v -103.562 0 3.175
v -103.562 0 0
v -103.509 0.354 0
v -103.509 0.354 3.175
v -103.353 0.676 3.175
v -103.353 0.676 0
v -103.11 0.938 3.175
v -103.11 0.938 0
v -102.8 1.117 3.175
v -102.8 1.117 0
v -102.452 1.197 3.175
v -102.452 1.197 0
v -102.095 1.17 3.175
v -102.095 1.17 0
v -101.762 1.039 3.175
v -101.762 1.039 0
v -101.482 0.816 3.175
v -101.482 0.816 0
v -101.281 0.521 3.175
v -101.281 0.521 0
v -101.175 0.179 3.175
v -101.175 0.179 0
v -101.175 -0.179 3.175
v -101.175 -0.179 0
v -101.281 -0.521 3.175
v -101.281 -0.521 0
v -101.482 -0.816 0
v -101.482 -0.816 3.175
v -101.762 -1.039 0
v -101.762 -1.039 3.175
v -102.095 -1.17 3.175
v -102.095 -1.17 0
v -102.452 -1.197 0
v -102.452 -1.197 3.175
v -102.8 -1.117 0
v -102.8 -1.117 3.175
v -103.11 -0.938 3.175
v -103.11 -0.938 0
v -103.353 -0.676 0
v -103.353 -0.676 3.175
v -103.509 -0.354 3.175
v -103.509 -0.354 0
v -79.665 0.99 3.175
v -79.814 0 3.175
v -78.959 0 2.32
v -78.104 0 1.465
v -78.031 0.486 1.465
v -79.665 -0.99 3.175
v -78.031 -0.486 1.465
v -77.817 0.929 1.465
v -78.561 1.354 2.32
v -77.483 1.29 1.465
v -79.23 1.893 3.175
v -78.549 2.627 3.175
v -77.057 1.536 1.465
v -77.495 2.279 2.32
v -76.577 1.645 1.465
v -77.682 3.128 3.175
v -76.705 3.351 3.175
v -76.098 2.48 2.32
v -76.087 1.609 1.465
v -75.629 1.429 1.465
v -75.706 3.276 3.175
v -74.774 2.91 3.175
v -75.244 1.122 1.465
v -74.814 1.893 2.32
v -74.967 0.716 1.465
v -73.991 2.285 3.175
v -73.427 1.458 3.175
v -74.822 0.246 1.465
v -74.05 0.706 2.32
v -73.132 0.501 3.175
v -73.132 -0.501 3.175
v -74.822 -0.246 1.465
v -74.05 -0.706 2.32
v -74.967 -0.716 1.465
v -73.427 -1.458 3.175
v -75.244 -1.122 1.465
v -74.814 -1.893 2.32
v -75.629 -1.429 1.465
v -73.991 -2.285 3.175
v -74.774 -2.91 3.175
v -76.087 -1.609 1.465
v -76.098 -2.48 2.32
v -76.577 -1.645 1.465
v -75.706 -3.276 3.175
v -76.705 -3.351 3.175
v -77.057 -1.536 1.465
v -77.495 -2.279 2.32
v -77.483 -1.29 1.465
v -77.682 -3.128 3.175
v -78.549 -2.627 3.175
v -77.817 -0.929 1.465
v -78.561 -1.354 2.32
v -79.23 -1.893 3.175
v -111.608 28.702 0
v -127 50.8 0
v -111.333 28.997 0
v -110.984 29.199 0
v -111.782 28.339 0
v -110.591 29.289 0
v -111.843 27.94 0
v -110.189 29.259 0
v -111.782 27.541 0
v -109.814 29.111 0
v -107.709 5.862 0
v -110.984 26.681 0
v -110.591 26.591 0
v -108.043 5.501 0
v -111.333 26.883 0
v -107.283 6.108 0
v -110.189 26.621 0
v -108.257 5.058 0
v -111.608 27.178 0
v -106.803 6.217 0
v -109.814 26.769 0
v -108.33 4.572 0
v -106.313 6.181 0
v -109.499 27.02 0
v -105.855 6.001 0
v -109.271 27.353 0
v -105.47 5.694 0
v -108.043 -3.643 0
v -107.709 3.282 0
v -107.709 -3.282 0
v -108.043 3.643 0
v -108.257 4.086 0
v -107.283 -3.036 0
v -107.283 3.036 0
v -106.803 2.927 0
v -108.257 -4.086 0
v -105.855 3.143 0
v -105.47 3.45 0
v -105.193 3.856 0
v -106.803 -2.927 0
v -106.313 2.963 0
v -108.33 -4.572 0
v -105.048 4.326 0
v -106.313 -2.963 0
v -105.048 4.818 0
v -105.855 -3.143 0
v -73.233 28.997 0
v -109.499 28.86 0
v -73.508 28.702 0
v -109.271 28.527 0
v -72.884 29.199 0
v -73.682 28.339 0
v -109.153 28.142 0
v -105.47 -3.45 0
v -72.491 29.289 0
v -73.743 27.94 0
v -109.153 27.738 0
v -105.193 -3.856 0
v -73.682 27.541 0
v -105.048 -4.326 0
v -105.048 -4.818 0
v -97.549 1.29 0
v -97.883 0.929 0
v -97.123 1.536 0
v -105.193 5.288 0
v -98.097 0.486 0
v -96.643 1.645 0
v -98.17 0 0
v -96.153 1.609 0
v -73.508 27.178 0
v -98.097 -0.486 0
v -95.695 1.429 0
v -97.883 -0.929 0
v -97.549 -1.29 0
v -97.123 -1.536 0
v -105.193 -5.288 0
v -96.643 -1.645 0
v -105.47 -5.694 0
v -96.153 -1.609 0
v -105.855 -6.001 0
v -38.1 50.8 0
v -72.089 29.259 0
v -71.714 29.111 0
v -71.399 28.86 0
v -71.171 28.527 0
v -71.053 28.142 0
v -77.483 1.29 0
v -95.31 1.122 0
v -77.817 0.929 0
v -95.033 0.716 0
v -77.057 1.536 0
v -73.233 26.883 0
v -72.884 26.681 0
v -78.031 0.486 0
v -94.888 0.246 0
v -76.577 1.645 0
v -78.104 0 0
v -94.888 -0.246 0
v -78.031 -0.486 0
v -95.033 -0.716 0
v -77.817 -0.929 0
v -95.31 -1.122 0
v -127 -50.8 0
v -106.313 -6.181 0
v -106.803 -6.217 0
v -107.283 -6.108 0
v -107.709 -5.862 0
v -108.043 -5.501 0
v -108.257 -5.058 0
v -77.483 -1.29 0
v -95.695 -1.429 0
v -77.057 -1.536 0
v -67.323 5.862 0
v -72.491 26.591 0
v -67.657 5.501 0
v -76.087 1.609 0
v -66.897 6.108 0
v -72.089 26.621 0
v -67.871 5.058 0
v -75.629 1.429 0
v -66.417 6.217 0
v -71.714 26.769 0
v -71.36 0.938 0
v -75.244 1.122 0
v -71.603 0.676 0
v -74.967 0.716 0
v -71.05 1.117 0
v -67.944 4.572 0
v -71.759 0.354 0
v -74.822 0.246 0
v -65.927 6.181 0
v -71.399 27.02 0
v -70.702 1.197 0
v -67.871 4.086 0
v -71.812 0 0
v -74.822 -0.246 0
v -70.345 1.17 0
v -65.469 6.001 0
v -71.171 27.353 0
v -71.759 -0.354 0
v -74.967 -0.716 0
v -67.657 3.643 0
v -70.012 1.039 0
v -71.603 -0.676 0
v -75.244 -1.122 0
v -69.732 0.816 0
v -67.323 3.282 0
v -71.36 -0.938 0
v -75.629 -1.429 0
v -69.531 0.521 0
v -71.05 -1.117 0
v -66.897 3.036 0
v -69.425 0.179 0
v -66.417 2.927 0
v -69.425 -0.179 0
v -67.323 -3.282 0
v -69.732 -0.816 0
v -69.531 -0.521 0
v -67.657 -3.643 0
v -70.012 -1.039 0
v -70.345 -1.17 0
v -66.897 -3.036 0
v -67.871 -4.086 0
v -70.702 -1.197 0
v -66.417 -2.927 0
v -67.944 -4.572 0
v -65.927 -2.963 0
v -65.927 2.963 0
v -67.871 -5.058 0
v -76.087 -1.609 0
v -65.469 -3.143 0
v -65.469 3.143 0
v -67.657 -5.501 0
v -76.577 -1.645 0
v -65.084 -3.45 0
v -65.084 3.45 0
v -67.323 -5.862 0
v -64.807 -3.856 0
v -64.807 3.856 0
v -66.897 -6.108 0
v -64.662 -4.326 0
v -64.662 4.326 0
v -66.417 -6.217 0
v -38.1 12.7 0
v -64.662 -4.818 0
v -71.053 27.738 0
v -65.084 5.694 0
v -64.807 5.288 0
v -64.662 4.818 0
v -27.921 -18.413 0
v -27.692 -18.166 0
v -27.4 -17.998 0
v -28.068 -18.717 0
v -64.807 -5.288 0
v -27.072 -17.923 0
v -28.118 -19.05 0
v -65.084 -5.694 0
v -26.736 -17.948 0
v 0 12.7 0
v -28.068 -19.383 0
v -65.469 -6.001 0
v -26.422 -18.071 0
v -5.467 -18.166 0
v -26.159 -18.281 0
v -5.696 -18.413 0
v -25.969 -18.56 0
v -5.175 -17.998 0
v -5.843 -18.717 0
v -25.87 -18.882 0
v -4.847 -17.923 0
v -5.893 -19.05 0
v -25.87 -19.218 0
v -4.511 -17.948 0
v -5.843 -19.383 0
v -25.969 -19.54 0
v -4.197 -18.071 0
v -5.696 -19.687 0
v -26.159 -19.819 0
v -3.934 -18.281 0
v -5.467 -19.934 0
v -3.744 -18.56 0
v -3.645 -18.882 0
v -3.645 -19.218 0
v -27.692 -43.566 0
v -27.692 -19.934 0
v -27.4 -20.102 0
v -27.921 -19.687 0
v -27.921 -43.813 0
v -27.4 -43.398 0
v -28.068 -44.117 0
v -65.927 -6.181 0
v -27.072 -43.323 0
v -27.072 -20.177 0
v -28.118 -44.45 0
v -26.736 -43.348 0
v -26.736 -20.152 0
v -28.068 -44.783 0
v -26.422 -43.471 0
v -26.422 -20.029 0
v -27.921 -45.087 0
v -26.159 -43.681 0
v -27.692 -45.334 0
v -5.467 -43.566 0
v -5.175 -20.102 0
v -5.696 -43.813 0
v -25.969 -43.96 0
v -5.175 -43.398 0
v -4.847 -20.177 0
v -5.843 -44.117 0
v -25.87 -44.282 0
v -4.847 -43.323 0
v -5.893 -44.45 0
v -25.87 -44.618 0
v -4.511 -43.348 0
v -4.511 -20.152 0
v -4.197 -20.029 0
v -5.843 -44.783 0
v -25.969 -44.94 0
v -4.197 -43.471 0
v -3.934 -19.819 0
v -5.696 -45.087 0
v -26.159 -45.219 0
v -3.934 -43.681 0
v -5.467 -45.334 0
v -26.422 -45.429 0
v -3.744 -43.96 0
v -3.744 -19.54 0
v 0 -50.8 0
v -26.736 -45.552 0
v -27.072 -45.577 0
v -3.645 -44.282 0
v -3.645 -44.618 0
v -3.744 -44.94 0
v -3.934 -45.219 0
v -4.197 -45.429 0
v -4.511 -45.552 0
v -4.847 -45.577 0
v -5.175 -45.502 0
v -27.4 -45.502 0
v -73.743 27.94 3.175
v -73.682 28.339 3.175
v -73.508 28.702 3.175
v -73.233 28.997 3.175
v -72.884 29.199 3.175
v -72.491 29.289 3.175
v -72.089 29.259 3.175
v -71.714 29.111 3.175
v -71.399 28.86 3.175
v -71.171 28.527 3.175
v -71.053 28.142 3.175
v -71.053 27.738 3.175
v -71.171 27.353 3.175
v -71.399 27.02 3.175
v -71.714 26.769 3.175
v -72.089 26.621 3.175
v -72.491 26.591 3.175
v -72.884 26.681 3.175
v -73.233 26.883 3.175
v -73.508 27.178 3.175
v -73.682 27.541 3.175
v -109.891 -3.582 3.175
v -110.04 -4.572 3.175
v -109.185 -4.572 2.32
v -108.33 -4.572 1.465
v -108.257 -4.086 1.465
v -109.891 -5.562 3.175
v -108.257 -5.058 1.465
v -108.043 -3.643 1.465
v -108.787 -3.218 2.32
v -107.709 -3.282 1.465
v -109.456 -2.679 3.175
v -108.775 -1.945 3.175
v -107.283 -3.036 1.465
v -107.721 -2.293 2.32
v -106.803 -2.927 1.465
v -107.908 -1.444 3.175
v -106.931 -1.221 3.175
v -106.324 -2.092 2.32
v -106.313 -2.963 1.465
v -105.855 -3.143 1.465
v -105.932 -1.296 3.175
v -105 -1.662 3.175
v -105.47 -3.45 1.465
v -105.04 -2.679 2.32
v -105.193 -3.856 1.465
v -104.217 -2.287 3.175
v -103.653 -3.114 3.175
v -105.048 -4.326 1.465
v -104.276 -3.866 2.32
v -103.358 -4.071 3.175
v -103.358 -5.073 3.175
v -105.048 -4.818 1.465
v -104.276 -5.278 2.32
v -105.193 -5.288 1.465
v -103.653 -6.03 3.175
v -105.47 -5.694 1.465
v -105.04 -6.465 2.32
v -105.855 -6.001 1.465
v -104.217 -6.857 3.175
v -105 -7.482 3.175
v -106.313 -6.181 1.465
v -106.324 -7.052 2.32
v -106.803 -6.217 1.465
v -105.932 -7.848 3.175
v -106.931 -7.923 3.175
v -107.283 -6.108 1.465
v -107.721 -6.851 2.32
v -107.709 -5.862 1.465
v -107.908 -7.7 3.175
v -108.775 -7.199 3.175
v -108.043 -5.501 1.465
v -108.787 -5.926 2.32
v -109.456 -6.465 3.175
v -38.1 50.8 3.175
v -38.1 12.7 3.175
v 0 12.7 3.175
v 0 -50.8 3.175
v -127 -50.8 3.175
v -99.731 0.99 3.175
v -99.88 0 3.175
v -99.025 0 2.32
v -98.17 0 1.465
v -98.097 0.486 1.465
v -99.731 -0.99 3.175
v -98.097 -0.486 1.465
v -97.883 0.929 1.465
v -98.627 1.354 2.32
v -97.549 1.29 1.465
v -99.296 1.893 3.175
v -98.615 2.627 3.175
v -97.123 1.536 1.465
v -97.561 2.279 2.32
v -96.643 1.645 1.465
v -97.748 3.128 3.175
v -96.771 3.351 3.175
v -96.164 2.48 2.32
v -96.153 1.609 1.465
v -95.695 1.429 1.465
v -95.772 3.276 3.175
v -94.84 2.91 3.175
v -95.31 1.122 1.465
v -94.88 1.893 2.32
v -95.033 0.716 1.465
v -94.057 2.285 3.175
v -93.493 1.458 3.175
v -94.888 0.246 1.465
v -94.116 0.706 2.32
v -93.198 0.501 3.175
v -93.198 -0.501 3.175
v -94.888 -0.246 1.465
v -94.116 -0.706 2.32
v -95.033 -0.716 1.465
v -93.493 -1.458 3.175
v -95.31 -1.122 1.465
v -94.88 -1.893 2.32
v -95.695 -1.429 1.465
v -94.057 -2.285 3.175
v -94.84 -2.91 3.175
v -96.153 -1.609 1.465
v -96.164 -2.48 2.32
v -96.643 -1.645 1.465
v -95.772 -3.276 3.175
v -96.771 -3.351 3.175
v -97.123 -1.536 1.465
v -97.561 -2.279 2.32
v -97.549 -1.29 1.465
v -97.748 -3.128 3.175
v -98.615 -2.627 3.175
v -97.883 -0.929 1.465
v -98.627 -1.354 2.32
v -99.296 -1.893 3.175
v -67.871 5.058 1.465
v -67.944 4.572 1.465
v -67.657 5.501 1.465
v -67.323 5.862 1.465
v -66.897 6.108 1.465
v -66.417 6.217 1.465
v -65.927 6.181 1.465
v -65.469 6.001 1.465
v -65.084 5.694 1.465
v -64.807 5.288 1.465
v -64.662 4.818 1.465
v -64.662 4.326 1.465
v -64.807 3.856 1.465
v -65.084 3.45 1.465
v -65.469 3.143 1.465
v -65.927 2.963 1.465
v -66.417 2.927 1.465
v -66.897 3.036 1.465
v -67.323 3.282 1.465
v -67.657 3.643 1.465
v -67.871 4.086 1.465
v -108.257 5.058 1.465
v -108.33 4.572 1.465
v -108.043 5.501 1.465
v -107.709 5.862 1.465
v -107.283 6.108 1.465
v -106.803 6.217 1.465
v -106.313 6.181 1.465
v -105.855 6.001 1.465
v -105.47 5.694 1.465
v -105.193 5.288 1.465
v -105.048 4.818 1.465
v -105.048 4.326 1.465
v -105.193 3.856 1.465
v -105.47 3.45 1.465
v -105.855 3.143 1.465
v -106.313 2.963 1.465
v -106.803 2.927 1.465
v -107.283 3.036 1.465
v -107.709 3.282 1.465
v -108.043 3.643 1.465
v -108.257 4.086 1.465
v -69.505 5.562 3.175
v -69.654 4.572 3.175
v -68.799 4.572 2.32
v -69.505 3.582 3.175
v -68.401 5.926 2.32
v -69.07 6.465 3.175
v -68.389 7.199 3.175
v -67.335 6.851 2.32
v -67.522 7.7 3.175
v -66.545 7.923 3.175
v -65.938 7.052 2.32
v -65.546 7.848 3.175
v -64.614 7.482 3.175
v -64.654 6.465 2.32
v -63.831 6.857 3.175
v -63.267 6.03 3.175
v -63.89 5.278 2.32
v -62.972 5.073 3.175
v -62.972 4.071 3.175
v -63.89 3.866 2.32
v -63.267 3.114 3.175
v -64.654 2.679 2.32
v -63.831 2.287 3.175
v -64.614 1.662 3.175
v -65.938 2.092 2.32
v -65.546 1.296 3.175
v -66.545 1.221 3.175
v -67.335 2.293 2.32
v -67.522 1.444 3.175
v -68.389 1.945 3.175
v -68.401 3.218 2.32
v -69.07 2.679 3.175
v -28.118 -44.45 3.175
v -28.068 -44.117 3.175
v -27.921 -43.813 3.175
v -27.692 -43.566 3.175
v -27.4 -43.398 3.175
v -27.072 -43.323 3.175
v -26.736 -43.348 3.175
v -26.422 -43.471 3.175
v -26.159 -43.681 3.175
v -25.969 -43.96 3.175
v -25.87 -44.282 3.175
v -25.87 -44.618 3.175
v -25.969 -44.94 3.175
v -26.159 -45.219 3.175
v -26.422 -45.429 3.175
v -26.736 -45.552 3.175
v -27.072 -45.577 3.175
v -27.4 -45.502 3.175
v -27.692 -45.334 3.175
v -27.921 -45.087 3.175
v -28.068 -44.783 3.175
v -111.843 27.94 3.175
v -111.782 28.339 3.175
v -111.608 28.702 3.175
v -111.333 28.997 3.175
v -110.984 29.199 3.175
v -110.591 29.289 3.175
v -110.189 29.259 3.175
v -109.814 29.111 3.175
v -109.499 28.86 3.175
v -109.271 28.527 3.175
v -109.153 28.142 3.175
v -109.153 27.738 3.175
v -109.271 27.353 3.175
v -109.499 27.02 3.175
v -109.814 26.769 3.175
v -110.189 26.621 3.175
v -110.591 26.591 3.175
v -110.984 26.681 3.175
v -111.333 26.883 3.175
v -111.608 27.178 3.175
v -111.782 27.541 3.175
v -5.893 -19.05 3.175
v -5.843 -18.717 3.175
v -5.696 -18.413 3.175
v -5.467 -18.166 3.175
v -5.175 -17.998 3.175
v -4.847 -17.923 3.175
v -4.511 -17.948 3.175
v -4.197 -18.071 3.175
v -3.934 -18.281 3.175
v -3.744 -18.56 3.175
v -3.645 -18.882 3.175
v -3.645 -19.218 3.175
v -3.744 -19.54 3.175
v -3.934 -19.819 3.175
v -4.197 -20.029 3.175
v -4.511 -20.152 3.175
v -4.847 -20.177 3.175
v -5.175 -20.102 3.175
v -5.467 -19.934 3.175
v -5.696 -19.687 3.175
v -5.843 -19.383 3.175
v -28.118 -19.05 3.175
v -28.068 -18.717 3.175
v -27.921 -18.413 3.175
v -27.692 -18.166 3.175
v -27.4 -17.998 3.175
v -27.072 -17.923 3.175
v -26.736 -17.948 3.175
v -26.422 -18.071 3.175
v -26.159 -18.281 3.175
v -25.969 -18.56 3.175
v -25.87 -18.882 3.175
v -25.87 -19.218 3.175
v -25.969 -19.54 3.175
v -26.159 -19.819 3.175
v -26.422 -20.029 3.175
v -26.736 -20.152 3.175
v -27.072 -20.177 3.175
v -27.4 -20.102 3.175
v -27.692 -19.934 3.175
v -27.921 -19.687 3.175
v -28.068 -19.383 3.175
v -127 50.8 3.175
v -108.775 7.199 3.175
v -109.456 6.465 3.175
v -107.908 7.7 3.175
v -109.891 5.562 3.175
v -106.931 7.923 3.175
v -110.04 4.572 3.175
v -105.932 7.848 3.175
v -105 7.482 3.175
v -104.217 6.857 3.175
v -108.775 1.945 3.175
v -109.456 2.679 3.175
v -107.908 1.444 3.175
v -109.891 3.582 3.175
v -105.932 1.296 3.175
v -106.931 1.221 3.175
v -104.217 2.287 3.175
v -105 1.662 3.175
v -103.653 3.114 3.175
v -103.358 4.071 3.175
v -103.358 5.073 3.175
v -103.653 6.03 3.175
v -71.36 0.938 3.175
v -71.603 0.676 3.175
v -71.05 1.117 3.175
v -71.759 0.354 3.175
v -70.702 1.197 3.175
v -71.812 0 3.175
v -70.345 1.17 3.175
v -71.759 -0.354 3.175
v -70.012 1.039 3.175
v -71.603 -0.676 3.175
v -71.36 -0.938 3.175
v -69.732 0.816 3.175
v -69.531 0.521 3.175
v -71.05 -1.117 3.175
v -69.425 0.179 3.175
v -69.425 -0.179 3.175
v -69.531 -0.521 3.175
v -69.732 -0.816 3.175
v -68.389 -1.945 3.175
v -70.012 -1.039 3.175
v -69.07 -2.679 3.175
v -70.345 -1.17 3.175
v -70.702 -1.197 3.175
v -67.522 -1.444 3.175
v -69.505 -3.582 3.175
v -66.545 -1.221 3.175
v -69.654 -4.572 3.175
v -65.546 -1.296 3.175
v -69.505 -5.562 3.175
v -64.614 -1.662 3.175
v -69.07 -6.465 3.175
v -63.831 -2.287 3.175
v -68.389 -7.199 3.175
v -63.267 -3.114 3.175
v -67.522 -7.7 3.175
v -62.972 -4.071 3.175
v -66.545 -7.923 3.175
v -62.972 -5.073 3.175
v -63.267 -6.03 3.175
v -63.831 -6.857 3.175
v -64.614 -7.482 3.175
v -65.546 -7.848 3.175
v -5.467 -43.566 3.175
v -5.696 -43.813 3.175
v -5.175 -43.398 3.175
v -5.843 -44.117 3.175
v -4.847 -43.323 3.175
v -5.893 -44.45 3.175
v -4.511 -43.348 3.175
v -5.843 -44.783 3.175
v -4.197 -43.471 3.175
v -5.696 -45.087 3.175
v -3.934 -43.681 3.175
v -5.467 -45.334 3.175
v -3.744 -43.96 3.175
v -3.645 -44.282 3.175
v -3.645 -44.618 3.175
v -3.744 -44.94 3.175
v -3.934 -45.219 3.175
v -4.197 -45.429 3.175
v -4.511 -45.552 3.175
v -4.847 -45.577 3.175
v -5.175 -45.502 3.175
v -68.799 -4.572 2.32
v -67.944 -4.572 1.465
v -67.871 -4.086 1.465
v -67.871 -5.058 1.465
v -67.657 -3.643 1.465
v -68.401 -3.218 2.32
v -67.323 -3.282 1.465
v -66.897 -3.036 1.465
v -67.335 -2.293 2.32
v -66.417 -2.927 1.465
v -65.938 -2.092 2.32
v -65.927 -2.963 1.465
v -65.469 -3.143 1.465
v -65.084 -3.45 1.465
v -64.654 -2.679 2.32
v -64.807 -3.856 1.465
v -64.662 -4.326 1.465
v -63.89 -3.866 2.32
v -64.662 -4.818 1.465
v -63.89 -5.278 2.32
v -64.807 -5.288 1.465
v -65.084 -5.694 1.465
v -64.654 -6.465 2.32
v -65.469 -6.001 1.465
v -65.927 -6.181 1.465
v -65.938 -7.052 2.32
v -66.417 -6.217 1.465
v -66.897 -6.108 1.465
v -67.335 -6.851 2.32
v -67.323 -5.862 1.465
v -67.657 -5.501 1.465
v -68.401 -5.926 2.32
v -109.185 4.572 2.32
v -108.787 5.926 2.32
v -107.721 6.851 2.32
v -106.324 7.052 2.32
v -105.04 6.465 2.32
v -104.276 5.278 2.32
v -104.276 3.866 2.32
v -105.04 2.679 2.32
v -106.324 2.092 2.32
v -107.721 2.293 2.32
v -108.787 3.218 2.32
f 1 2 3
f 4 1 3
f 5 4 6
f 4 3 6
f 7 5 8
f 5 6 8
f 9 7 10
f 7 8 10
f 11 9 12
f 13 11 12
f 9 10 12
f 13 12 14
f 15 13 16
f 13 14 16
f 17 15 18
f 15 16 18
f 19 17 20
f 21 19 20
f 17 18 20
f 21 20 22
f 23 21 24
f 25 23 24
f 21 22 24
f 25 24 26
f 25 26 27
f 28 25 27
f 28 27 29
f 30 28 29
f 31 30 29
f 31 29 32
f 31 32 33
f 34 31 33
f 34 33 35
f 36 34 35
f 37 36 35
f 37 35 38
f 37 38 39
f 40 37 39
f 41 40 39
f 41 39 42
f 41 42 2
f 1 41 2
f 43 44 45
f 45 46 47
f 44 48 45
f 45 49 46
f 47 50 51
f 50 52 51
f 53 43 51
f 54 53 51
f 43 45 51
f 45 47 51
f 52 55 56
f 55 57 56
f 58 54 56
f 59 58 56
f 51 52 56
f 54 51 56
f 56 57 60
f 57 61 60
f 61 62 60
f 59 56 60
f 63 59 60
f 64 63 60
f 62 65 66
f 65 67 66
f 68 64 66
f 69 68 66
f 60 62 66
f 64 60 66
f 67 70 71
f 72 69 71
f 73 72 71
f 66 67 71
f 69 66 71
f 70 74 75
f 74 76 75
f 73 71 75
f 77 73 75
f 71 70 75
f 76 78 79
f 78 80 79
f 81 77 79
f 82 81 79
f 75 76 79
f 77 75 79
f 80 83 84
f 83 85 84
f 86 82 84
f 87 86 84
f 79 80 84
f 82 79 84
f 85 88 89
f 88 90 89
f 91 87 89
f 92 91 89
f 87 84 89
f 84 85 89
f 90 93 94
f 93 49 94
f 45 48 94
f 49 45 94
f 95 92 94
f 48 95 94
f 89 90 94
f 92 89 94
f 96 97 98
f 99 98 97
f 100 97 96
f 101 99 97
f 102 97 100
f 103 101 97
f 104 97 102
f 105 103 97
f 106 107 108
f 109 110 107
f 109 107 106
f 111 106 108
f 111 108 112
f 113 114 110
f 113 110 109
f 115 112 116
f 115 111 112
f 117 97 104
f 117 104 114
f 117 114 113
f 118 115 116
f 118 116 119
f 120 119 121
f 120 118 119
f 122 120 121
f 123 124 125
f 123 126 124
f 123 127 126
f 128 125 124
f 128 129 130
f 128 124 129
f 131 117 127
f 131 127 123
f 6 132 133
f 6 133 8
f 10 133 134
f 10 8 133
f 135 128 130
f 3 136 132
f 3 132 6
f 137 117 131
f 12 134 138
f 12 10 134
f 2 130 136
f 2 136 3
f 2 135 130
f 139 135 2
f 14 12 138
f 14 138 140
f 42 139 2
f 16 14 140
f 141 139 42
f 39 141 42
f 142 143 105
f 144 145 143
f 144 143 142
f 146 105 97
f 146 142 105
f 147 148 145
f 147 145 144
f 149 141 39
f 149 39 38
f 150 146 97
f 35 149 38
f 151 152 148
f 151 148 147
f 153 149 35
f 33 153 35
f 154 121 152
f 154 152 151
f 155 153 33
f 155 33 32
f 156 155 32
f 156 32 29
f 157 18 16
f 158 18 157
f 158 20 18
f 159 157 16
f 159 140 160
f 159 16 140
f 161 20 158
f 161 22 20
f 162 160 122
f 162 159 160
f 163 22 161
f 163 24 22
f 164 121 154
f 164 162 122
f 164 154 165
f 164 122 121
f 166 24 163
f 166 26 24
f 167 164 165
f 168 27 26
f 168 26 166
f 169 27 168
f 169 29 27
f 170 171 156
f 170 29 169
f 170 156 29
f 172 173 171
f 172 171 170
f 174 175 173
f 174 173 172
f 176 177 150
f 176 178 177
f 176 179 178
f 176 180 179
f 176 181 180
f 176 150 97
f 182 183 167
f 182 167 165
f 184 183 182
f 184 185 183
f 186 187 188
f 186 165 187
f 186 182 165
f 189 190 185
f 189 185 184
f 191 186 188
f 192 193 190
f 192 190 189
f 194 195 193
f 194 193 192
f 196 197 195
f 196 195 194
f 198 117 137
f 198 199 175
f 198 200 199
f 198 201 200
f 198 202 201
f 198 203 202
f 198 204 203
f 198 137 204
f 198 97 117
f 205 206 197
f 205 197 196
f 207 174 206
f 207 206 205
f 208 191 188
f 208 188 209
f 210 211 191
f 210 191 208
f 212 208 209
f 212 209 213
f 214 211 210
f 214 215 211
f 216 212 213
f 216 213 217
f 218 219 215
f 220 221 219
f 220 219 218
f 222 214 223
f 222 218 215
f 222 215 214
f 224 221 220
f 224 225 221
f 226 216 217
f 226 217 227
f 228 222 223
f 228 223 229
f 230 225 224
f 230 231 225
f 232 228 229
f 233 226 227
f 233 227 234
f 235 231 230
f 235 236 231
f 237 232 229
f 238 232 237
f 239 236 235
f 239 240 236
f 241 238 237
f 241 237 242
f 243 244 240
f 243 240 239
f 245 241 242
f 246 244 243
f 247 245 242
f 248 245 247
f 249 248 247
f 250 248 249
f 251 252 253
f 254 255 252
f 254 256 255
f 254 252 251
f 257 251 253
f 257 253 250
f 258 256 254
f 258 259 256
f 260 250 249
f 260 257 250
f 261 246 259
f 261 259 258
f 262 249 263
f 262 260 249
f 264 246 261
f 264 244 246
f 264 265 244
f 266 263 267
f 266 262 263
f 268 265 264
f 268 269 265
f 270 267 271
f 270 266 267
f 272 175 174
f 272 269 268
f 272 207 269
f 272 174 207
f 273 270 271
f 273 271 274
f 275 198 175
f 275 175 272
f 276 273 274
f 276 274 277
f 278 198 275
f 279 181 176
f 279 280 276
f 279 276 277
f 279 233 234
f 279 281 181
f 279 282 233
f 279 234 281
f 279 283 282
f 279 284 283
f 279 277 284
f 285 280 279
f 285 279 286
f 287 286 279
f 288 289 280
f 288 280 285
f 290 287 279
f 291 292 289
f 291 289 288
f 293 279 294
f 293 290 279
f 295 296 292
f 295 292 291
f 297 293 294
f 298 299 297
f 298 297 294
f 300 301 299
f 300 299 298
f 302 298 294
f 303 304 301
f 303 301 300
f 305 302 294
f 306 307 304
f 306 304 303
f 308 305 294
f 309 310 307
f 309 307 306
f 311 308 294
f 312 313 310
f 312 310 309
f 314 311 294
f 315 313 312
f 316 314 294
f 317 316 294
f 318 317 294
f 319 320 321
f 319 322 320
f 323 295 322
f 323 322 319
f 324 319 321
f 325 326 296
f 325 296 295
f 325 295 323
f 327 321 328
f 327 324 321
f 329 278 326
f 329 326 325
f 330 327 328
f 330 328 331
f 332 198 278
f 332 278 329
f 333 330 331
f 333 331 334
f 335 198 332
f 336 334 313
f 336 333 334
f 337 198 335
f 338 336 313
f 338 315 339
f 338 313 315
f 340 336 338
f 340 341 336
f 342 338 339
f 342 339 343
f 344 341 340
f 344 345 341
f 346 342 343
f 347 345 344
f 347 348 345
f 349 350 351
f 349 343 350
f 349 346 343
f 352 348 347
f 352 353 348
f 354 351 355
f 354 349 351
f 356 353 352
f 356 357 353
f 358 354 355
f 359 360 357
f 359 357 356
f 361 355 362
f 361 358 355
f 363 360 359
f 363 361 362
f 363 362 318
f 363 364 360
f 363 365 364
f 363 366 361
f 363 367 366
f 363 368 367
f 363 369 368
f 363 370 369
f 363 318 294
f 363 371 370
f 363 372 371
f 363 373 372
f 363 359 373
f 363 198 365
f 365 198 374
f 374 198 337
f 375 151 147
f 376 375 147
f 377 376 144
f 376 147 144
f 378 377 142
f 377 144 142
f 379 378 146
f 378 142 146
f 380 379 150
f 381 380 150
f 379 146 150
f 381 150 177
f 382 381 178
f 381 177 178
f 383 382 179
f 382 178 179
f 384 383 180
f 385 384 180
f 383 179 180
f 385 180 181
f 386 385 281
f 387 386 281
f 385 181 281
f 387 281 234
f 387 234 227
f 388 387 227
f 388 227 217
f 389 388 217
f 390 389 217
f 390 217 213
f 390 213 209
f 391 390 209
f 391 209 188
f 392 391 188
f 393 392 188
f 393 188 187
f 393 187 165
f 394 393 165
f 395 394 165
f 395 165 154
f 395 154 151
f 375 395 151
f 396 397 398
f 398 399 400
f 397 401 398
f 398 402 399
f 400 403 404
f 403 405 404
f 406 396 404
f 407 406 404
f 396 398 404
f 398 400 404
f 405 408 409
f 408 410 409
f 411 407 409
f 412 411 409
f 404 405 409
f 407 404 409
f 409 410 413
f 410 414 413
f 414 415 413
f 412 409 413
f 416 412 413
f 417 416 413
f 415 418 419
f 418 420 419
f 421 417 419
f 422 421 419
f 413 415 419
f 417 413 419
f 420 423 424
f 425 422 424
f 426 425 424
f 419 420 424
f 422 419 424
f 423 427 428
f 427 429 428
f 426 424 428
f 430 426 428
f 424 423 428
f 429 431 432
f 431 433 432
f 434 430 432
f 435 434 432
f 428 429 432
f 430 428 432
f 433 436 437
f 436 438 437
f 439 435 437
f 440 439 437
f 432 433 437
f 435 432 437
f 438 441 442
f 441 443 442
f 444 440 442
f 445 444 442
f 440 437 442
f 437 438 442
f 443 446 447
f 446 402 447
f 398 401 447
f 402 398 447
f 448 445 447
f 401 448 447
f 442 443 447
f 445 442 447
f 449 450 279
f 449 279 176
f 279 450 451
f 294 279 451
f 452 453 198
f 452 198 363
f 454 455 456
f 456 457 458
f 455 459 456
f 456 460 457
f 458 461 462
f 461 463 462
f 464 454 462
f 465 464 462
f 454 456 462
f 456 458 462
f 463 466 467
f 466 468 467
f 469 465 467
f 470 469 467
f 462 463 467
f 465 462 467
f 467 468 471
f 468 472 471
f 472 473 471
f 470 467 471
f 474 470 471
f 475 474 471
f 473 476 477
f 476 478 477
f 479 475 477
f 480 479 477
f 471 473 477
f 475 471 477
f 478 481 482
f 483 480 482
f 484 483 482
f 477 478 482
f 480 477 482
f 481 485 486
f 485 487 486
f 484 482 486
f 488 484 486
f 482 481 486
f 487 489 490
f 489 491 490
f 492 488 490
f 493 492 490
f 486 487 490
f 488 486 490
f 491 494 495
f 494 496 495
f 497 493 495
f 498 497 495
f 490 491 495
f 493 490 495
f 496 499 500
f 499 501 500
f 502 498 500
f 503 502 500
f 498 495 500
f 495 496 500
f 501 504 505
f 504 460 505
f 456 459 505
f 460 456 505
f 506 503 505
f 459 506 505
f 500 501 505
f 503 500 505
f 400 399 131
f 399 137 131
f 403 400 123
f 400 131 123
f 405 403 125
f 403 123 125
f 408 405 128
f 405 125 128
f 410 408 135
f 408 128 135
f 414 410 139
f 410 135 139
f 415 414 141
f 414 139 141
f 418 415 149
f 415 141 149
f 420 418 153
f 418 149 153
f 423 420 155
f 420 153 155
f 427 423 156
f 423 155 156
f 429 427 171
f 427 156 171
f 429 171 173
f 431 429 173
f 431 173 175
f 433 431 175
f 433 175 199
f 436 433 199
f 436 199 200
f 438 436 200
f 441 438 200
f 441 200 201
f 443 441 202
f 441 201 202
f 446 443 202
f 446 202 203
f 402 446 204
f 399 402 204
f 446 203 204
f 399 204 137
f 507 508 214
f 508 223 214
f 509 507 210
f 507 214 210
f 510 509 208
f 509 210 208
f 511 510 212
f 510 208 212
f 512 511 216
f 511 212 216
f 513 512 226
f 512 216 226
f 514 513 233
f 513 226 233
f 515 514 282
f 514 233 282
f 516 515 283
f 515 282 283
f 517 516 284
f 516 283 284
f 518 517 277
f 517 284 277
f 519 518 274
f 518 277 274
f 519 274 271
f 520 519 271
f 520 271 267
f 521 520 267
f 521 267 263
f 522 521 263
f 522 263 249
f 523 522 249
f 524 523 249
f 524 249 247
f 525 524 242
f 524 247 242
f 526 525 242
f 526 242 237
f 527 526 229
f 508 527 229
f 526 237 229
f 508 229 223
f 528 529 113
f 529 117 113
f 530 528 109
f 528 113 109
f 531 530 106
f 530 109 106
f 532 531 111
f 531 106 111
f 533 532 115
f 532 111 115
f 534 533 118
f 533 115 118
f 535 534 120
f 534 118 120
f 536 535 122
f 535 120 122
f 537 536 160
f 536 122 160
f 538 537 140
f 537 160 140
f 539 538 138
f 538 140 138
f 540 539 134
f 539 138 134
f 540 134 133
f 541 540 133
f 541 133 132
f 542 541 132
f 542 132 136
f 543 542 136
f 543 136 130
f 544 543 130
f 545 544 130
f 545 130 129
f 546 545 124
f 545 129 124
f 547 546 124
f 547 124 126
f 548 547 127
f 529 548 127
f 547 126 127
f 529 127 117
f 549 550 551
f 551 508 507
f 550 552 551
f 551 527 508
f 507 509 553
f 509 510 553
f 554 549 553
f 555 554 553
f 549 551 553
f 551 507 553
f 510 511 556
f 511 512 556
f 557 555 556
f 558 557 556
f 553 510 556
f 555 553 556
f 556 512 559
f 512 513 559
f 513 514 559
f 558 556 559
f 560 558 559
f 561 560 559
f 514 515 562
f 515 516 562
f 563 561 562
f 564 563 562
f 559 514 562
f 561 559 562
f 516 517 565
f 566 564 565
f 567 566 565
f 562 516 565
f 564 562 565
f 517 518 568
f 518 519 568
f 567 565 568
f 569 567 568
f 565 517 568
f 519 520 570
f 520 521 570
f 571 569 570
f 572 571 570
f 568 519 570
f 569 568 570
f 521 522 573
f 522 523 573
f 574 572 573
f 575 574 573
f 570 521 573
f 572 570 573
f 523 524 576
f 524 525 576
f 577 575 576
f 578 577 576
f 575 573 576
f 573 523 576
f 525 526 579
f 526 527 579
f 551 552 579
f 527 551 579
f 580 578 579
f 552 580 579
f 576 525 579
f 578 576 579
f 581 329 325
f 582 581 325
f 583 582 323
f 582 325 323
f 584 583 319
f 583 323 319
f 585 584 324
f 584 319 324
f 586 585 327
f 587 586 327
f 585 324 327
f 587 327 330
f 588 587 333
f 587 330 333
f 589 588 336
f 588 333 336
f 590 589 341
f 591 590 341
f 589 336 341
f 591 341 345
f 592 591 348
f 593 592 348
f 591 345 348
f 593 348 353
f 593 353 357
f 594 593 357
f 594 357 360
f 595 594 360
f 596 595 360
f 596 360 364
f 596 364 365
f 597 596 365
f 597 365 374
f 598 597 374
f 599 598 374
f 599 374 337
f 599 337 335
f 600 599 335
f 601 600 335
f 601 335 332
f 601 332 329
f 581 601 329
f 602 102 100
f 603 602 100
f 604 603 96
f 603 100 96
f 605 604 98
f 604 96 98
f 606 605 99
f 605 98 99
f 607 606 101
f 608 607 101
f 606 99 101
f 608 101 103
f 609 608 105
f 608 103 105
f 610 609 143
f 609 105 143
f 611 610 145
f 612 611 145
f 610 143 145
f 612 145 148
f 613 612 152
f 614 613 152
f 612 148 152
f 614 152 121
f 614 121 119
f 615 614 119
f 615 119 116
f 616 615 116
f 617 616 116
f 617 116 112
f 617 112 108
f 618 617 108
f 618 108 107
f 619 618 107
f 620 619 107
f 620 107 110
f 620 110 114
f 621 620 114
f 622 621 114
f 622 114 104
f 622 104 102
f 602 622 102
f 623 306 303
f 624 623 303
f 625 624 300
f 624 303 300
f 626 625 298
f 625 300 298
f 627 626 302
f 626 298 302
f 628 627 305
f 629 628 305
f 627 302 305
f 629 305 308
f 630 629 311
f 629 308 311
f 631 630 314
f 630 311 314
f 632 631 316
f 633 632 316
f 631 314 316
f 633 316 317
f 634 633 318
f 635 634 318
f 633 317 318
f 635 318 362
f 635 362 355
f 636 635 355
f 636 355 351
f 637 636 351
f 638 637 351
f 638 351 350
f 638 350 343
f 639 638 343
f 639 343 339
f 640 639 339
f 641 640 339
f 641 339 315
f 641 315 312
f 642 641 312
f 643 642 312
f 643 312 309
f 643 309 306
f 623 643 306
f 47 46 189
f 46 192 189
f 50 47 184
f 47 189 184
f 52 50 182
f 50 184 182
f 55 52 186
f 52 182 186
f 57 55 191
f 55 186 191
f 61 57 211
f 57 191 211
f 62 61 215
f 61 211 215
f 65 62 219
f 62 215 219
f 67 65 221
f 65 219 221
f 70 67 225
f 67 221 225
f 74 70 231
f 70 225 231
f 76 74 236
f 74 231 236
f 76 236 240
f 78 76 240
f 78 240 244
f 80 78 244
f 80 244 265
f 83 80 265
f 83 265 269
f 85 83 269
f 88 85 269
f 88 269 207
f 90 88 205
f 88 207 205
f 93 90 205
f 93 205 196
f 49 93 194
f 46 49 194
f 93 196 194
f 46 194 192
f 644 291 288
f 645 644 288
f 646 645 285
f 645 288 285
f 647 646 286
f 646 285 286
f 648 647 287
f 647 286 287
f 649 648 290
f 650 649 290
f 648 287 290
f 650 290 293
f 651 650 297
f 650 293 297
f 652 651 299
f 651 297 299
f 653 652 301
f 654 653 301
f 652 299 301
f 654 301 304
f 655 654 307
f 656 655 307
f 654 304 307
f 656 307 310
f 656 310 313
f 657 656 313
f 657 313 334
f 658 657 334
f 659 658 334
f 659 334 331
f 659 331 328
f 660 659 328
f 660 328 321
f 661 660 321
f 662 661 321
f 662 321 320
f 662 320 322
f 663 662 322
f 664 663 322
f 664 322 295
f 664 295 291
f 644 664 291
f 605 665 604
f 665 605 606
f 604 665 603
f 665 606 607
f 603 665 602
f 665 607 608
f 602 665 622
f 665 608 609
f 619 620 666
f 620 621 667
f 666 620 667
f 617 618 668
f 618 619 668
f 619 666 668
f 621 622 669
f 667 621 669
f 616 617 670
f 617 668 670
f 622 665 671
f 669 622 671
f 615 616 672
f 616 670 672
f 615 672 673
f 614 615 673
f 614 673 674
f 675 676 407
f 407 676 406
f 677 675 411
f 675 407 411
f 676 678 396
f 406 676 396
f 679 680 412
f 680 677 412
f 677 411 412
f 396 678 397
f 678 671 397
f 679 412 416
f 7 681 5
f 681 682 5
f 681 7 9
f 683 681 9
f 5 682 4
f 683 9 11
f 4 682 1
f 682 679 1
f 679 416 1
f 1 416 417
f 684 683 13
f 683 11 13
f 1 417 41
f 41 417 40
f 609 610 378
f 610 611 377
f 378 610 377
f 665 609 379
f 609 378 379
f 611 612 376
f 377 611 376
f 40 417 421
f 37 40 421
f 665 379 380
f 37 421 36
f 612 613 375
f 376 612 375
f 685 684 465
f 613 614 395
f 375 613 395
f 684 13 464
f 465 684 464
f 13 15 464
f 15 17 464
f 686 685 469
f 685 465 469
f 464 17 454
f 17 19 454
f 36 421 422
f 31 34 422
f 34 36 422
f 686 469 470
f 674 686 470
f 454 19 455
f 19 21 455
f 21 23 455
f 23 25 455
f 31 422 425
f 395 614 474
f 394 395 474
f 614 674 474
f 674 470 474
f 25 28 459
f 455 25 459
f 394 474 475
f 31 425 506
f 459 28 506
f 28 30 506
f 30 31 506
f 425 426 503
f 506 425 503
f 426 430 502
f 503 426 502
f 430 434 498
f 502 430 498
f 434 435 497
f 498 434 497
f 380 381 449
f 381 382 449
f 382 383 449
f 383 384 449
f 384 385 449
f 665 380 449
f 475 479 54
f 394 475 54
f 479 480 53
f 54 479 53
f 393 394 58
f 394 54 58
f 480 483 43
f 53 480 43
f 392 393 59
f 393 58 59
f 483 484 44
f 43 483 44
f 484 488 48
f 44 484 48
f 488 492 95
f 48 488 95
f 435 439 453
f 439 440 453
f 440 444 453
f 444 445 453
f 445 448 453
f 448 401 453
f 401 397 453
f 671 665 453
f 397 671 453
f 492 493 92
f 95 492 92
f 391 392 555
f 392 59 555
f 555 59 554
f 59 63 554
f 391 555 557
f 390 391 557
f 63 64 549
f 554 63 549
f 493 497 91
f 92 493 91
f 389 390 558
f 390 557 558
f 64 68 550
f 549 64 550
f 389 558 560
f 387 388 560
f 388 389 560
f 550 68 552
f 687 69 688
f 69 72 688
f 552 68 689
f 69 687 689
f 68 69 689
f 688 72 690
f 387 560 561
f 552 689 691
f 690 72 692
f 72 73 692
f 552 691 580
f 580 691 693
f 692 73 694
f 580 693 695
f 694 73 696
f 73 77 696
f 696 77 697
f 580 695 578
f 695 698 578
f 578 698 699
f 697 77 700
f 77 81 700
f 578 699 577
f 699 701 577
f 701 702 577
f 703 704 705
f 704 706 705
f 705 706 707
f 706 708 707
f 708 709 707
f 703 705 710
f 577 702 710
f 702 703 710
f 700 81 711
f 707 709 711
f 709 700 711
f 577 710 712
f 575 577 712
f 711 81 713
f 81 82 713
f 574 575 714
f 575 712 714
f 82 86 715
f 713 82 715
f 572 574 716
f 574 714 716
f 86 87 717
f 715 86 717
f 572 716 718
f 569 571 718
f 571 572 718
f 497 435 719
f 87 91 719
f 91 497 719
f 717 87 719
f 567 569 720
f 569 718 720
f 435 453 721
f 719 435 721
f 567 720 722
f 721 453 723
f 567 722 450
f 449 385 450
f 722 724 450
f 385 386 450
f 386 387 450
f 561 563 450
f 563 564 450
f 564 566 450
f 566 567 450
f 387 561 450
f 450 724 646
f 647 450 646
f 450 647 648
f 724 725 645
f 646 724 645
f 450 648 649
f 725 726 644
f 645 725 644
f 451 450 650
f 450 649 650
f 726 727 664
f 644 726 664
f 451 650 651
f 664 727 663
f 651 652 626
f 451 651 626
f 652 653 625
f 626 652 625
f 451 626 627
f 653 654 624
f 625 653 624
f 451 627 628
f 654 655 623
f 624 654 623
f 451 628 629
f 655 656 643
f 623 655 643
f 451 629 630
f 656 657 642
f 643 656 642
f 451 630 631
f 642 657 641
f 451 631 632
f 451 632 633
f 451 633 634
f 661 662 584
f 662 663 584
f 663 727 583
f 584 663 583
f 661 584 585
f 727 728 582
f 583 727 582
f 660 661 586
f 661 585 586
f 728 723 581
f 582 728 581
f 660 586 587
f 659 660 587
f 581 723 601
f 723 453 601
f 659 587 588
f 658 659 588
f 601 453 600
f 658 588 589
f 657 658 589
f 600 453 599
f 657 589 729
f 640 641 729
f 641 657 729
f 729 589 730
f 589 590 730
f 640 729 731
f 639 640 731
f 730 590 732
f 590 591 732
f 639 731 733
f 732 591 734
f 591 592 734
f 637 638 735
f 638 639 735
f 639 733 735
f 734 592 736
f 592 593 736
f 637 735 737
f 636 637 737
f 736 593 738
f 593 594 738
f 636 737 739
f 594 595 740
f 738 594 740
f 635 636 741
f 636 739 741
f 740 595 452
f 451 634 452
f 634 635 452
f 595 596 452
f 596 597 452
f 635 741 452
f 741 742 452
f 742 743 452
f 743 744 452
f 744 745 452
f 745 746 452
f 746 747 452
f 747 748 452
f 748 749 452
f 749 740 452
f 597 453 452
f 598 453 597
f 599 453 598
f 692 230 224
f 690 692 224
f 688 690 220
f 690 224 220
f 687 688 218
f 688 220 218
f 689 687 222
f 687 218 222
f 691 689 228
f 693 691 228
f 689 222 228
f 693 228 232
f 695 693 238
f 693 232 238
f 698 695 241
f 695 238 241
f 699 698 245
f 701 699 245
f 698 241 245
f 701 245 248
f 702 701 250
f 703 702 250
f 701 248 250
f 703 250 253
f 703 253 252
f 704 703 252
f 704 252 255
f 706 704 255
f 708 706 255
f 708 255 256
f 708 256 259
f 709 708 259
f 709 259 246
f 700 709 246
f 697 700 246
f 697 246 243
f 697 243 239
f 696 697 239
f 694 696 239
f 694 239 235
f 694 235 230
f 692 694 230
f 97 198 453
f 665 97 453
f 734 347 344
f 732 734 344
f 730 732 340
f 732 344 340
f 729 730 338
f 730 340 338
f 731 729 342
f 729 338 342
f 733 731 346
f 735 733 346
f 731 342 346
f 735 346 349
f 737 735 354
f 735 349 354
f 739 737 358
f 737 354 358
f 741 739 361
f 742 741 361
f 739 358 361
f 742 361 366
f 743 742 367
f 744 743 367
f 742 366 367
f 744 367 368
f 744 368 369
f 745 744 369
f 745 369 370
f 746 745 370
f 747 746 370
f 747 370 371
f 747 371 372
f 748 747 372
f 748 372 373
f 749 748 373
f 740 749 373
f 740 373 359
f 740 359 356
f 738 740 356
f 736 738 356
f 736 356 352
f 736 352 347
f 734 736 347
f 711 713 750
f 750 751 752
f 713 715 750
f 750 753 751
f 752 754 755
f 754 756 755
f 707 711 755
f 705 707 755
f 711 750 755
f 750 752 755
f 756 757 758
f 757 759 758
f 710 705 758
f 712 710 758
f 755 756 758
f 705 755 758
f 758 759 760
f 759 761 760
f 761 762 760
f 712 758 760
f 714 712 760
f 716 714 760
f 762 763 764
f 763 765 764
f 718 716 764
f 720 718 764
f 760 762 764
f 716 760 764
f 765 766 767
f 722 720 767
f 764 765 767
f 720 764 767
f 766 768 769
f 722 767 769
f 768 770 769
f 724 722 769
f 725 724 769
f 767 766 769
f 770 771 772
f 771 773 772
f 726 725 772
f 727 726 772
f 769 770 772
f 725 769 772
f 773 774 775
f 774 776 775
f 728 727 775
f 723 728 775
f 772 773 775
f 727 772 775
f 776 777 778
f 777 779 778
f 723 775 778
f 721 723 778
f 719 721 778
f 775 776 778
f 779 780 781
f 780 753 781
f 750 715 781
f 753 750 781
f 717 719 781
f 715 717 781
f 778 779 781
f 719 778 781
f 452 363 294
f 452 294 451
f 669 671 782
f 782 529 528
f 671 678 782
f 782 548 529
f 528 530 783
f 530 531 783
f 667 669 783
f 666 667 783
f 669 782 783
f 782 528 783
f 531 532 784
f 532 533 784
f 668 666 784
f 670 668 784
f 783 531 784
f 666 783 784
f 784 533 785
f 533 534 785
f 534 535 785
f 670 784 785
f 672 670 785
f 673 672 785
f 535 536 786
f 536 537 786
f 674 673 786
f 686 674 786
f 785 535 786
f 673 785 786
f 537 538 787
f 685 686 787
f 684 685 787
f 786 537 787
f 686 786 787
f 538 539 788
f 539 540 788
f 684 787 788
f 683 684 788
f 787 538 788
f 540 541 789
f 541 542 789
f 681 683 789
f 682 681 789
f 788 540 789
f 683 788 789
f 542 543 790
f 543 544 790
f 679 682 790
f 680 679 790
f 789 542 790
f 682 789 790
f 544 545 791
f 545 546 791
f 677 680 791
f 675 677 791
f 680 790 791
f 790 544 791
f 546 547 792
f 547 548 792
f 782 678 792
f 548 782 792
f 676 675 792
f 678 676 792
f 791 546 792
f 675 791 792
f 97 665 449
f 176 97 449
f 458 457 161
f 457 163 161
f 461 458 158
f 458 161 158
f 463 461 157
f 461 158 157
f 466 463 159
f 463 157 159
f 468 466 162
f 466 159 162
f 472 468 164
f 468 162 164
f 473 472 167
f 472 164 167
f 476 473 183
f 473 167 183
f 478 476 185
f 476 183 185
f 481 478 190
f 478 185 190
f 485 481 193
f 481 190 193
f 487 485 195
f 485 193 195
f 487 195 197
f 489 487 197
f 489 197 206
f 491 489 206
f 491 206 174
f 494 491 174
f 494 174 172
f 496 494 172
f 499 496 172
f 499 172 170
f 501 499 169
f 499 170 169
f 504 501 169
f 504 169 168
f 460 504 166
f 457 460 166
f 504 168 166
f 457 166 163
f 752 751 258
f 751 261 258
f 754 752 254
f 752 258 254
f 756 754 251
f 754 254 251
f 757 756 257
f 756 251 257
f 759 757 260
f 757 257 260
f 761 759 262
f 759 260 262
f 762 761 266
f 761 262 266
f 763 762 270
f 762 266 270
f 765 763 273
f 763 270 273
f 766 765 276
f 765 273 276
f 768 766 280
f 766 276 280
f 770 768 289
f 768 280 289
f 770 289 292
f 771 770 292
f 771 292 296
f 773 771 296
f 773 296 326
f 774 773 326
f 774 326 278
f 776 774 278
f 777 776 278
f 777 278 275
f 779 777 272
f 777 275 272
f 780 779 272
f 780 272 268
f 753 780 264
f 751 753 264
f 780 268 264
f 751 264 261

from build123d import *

# Parameters (mm, degrees)
F0_W           = 127
F0_H           = 3.175
F1_DEPTH       = 50.8
F3_D           = 3.3
F3_CSINK_D     = 6.72
F3_CSINK_ANGLE = 90
F5_D           = 2.4
F6_W           = 38.1
F6_H           = 38.1
F7_DEPTH       = 3.176
F9_D           = 2.2606
F11_D          = 2.7051


with BuildPart() as f1:
    # F0 (on Front) → F1 (new body, symmetric)
    with BuildSketch(Plane.XZ):
        with Locations((-63.5, 1.5875)):
            Rectangle(F0_W, F0_H)
    extrude(amount=F1_DEPTH, both=True)

    # F3 (through all)
    with Locations(Plane.XY.offset(3.175)):
        with Locations((-66.294, 4.572), (-66.294, -4.572), (-76.454, 0), (-96.52, 0), (-106.68, 4.572), (-106.68, -4.572)):
            CounterSinkHole(F3_D / 2, F3_CSINK_D / 2, counter_sink_angle=F3_CSINK_ANGLE)

    # F5 (through all)
    with Locations(Plane.XY.offset(3.175)):
        with Locations((-102.362, 0), (-70.612, 0)):
            Hole(F5_D / 2)

    # F6 (on face) → F7 (cut, through all)
    with BuildSketch(Plane.XY.offset(3.175)):
        with Locations((-19.05, 31.75)):
            Rectangle(F6_W, F6_H)
    extrude(amount=-F7_DEPTH, mode=Mode.SUBTRACT)

    # F9 (through all)
    with Locations(Plane.XY.offset(3.175)):
        with Locations((-26.9875, -44.45), (-26.9875, -19.05), (-4.7625, -19.05), (-4.7625, -44.45)):
            Hole(F9_D / 2)

    # F11 (through all)
    with Locations(Plane.XY.offset(3.175)):
        with Locations((-110.49, 27.94), (-72.39, 27.94)):
            Hole(F11_D / 2)


solid = f1.part
